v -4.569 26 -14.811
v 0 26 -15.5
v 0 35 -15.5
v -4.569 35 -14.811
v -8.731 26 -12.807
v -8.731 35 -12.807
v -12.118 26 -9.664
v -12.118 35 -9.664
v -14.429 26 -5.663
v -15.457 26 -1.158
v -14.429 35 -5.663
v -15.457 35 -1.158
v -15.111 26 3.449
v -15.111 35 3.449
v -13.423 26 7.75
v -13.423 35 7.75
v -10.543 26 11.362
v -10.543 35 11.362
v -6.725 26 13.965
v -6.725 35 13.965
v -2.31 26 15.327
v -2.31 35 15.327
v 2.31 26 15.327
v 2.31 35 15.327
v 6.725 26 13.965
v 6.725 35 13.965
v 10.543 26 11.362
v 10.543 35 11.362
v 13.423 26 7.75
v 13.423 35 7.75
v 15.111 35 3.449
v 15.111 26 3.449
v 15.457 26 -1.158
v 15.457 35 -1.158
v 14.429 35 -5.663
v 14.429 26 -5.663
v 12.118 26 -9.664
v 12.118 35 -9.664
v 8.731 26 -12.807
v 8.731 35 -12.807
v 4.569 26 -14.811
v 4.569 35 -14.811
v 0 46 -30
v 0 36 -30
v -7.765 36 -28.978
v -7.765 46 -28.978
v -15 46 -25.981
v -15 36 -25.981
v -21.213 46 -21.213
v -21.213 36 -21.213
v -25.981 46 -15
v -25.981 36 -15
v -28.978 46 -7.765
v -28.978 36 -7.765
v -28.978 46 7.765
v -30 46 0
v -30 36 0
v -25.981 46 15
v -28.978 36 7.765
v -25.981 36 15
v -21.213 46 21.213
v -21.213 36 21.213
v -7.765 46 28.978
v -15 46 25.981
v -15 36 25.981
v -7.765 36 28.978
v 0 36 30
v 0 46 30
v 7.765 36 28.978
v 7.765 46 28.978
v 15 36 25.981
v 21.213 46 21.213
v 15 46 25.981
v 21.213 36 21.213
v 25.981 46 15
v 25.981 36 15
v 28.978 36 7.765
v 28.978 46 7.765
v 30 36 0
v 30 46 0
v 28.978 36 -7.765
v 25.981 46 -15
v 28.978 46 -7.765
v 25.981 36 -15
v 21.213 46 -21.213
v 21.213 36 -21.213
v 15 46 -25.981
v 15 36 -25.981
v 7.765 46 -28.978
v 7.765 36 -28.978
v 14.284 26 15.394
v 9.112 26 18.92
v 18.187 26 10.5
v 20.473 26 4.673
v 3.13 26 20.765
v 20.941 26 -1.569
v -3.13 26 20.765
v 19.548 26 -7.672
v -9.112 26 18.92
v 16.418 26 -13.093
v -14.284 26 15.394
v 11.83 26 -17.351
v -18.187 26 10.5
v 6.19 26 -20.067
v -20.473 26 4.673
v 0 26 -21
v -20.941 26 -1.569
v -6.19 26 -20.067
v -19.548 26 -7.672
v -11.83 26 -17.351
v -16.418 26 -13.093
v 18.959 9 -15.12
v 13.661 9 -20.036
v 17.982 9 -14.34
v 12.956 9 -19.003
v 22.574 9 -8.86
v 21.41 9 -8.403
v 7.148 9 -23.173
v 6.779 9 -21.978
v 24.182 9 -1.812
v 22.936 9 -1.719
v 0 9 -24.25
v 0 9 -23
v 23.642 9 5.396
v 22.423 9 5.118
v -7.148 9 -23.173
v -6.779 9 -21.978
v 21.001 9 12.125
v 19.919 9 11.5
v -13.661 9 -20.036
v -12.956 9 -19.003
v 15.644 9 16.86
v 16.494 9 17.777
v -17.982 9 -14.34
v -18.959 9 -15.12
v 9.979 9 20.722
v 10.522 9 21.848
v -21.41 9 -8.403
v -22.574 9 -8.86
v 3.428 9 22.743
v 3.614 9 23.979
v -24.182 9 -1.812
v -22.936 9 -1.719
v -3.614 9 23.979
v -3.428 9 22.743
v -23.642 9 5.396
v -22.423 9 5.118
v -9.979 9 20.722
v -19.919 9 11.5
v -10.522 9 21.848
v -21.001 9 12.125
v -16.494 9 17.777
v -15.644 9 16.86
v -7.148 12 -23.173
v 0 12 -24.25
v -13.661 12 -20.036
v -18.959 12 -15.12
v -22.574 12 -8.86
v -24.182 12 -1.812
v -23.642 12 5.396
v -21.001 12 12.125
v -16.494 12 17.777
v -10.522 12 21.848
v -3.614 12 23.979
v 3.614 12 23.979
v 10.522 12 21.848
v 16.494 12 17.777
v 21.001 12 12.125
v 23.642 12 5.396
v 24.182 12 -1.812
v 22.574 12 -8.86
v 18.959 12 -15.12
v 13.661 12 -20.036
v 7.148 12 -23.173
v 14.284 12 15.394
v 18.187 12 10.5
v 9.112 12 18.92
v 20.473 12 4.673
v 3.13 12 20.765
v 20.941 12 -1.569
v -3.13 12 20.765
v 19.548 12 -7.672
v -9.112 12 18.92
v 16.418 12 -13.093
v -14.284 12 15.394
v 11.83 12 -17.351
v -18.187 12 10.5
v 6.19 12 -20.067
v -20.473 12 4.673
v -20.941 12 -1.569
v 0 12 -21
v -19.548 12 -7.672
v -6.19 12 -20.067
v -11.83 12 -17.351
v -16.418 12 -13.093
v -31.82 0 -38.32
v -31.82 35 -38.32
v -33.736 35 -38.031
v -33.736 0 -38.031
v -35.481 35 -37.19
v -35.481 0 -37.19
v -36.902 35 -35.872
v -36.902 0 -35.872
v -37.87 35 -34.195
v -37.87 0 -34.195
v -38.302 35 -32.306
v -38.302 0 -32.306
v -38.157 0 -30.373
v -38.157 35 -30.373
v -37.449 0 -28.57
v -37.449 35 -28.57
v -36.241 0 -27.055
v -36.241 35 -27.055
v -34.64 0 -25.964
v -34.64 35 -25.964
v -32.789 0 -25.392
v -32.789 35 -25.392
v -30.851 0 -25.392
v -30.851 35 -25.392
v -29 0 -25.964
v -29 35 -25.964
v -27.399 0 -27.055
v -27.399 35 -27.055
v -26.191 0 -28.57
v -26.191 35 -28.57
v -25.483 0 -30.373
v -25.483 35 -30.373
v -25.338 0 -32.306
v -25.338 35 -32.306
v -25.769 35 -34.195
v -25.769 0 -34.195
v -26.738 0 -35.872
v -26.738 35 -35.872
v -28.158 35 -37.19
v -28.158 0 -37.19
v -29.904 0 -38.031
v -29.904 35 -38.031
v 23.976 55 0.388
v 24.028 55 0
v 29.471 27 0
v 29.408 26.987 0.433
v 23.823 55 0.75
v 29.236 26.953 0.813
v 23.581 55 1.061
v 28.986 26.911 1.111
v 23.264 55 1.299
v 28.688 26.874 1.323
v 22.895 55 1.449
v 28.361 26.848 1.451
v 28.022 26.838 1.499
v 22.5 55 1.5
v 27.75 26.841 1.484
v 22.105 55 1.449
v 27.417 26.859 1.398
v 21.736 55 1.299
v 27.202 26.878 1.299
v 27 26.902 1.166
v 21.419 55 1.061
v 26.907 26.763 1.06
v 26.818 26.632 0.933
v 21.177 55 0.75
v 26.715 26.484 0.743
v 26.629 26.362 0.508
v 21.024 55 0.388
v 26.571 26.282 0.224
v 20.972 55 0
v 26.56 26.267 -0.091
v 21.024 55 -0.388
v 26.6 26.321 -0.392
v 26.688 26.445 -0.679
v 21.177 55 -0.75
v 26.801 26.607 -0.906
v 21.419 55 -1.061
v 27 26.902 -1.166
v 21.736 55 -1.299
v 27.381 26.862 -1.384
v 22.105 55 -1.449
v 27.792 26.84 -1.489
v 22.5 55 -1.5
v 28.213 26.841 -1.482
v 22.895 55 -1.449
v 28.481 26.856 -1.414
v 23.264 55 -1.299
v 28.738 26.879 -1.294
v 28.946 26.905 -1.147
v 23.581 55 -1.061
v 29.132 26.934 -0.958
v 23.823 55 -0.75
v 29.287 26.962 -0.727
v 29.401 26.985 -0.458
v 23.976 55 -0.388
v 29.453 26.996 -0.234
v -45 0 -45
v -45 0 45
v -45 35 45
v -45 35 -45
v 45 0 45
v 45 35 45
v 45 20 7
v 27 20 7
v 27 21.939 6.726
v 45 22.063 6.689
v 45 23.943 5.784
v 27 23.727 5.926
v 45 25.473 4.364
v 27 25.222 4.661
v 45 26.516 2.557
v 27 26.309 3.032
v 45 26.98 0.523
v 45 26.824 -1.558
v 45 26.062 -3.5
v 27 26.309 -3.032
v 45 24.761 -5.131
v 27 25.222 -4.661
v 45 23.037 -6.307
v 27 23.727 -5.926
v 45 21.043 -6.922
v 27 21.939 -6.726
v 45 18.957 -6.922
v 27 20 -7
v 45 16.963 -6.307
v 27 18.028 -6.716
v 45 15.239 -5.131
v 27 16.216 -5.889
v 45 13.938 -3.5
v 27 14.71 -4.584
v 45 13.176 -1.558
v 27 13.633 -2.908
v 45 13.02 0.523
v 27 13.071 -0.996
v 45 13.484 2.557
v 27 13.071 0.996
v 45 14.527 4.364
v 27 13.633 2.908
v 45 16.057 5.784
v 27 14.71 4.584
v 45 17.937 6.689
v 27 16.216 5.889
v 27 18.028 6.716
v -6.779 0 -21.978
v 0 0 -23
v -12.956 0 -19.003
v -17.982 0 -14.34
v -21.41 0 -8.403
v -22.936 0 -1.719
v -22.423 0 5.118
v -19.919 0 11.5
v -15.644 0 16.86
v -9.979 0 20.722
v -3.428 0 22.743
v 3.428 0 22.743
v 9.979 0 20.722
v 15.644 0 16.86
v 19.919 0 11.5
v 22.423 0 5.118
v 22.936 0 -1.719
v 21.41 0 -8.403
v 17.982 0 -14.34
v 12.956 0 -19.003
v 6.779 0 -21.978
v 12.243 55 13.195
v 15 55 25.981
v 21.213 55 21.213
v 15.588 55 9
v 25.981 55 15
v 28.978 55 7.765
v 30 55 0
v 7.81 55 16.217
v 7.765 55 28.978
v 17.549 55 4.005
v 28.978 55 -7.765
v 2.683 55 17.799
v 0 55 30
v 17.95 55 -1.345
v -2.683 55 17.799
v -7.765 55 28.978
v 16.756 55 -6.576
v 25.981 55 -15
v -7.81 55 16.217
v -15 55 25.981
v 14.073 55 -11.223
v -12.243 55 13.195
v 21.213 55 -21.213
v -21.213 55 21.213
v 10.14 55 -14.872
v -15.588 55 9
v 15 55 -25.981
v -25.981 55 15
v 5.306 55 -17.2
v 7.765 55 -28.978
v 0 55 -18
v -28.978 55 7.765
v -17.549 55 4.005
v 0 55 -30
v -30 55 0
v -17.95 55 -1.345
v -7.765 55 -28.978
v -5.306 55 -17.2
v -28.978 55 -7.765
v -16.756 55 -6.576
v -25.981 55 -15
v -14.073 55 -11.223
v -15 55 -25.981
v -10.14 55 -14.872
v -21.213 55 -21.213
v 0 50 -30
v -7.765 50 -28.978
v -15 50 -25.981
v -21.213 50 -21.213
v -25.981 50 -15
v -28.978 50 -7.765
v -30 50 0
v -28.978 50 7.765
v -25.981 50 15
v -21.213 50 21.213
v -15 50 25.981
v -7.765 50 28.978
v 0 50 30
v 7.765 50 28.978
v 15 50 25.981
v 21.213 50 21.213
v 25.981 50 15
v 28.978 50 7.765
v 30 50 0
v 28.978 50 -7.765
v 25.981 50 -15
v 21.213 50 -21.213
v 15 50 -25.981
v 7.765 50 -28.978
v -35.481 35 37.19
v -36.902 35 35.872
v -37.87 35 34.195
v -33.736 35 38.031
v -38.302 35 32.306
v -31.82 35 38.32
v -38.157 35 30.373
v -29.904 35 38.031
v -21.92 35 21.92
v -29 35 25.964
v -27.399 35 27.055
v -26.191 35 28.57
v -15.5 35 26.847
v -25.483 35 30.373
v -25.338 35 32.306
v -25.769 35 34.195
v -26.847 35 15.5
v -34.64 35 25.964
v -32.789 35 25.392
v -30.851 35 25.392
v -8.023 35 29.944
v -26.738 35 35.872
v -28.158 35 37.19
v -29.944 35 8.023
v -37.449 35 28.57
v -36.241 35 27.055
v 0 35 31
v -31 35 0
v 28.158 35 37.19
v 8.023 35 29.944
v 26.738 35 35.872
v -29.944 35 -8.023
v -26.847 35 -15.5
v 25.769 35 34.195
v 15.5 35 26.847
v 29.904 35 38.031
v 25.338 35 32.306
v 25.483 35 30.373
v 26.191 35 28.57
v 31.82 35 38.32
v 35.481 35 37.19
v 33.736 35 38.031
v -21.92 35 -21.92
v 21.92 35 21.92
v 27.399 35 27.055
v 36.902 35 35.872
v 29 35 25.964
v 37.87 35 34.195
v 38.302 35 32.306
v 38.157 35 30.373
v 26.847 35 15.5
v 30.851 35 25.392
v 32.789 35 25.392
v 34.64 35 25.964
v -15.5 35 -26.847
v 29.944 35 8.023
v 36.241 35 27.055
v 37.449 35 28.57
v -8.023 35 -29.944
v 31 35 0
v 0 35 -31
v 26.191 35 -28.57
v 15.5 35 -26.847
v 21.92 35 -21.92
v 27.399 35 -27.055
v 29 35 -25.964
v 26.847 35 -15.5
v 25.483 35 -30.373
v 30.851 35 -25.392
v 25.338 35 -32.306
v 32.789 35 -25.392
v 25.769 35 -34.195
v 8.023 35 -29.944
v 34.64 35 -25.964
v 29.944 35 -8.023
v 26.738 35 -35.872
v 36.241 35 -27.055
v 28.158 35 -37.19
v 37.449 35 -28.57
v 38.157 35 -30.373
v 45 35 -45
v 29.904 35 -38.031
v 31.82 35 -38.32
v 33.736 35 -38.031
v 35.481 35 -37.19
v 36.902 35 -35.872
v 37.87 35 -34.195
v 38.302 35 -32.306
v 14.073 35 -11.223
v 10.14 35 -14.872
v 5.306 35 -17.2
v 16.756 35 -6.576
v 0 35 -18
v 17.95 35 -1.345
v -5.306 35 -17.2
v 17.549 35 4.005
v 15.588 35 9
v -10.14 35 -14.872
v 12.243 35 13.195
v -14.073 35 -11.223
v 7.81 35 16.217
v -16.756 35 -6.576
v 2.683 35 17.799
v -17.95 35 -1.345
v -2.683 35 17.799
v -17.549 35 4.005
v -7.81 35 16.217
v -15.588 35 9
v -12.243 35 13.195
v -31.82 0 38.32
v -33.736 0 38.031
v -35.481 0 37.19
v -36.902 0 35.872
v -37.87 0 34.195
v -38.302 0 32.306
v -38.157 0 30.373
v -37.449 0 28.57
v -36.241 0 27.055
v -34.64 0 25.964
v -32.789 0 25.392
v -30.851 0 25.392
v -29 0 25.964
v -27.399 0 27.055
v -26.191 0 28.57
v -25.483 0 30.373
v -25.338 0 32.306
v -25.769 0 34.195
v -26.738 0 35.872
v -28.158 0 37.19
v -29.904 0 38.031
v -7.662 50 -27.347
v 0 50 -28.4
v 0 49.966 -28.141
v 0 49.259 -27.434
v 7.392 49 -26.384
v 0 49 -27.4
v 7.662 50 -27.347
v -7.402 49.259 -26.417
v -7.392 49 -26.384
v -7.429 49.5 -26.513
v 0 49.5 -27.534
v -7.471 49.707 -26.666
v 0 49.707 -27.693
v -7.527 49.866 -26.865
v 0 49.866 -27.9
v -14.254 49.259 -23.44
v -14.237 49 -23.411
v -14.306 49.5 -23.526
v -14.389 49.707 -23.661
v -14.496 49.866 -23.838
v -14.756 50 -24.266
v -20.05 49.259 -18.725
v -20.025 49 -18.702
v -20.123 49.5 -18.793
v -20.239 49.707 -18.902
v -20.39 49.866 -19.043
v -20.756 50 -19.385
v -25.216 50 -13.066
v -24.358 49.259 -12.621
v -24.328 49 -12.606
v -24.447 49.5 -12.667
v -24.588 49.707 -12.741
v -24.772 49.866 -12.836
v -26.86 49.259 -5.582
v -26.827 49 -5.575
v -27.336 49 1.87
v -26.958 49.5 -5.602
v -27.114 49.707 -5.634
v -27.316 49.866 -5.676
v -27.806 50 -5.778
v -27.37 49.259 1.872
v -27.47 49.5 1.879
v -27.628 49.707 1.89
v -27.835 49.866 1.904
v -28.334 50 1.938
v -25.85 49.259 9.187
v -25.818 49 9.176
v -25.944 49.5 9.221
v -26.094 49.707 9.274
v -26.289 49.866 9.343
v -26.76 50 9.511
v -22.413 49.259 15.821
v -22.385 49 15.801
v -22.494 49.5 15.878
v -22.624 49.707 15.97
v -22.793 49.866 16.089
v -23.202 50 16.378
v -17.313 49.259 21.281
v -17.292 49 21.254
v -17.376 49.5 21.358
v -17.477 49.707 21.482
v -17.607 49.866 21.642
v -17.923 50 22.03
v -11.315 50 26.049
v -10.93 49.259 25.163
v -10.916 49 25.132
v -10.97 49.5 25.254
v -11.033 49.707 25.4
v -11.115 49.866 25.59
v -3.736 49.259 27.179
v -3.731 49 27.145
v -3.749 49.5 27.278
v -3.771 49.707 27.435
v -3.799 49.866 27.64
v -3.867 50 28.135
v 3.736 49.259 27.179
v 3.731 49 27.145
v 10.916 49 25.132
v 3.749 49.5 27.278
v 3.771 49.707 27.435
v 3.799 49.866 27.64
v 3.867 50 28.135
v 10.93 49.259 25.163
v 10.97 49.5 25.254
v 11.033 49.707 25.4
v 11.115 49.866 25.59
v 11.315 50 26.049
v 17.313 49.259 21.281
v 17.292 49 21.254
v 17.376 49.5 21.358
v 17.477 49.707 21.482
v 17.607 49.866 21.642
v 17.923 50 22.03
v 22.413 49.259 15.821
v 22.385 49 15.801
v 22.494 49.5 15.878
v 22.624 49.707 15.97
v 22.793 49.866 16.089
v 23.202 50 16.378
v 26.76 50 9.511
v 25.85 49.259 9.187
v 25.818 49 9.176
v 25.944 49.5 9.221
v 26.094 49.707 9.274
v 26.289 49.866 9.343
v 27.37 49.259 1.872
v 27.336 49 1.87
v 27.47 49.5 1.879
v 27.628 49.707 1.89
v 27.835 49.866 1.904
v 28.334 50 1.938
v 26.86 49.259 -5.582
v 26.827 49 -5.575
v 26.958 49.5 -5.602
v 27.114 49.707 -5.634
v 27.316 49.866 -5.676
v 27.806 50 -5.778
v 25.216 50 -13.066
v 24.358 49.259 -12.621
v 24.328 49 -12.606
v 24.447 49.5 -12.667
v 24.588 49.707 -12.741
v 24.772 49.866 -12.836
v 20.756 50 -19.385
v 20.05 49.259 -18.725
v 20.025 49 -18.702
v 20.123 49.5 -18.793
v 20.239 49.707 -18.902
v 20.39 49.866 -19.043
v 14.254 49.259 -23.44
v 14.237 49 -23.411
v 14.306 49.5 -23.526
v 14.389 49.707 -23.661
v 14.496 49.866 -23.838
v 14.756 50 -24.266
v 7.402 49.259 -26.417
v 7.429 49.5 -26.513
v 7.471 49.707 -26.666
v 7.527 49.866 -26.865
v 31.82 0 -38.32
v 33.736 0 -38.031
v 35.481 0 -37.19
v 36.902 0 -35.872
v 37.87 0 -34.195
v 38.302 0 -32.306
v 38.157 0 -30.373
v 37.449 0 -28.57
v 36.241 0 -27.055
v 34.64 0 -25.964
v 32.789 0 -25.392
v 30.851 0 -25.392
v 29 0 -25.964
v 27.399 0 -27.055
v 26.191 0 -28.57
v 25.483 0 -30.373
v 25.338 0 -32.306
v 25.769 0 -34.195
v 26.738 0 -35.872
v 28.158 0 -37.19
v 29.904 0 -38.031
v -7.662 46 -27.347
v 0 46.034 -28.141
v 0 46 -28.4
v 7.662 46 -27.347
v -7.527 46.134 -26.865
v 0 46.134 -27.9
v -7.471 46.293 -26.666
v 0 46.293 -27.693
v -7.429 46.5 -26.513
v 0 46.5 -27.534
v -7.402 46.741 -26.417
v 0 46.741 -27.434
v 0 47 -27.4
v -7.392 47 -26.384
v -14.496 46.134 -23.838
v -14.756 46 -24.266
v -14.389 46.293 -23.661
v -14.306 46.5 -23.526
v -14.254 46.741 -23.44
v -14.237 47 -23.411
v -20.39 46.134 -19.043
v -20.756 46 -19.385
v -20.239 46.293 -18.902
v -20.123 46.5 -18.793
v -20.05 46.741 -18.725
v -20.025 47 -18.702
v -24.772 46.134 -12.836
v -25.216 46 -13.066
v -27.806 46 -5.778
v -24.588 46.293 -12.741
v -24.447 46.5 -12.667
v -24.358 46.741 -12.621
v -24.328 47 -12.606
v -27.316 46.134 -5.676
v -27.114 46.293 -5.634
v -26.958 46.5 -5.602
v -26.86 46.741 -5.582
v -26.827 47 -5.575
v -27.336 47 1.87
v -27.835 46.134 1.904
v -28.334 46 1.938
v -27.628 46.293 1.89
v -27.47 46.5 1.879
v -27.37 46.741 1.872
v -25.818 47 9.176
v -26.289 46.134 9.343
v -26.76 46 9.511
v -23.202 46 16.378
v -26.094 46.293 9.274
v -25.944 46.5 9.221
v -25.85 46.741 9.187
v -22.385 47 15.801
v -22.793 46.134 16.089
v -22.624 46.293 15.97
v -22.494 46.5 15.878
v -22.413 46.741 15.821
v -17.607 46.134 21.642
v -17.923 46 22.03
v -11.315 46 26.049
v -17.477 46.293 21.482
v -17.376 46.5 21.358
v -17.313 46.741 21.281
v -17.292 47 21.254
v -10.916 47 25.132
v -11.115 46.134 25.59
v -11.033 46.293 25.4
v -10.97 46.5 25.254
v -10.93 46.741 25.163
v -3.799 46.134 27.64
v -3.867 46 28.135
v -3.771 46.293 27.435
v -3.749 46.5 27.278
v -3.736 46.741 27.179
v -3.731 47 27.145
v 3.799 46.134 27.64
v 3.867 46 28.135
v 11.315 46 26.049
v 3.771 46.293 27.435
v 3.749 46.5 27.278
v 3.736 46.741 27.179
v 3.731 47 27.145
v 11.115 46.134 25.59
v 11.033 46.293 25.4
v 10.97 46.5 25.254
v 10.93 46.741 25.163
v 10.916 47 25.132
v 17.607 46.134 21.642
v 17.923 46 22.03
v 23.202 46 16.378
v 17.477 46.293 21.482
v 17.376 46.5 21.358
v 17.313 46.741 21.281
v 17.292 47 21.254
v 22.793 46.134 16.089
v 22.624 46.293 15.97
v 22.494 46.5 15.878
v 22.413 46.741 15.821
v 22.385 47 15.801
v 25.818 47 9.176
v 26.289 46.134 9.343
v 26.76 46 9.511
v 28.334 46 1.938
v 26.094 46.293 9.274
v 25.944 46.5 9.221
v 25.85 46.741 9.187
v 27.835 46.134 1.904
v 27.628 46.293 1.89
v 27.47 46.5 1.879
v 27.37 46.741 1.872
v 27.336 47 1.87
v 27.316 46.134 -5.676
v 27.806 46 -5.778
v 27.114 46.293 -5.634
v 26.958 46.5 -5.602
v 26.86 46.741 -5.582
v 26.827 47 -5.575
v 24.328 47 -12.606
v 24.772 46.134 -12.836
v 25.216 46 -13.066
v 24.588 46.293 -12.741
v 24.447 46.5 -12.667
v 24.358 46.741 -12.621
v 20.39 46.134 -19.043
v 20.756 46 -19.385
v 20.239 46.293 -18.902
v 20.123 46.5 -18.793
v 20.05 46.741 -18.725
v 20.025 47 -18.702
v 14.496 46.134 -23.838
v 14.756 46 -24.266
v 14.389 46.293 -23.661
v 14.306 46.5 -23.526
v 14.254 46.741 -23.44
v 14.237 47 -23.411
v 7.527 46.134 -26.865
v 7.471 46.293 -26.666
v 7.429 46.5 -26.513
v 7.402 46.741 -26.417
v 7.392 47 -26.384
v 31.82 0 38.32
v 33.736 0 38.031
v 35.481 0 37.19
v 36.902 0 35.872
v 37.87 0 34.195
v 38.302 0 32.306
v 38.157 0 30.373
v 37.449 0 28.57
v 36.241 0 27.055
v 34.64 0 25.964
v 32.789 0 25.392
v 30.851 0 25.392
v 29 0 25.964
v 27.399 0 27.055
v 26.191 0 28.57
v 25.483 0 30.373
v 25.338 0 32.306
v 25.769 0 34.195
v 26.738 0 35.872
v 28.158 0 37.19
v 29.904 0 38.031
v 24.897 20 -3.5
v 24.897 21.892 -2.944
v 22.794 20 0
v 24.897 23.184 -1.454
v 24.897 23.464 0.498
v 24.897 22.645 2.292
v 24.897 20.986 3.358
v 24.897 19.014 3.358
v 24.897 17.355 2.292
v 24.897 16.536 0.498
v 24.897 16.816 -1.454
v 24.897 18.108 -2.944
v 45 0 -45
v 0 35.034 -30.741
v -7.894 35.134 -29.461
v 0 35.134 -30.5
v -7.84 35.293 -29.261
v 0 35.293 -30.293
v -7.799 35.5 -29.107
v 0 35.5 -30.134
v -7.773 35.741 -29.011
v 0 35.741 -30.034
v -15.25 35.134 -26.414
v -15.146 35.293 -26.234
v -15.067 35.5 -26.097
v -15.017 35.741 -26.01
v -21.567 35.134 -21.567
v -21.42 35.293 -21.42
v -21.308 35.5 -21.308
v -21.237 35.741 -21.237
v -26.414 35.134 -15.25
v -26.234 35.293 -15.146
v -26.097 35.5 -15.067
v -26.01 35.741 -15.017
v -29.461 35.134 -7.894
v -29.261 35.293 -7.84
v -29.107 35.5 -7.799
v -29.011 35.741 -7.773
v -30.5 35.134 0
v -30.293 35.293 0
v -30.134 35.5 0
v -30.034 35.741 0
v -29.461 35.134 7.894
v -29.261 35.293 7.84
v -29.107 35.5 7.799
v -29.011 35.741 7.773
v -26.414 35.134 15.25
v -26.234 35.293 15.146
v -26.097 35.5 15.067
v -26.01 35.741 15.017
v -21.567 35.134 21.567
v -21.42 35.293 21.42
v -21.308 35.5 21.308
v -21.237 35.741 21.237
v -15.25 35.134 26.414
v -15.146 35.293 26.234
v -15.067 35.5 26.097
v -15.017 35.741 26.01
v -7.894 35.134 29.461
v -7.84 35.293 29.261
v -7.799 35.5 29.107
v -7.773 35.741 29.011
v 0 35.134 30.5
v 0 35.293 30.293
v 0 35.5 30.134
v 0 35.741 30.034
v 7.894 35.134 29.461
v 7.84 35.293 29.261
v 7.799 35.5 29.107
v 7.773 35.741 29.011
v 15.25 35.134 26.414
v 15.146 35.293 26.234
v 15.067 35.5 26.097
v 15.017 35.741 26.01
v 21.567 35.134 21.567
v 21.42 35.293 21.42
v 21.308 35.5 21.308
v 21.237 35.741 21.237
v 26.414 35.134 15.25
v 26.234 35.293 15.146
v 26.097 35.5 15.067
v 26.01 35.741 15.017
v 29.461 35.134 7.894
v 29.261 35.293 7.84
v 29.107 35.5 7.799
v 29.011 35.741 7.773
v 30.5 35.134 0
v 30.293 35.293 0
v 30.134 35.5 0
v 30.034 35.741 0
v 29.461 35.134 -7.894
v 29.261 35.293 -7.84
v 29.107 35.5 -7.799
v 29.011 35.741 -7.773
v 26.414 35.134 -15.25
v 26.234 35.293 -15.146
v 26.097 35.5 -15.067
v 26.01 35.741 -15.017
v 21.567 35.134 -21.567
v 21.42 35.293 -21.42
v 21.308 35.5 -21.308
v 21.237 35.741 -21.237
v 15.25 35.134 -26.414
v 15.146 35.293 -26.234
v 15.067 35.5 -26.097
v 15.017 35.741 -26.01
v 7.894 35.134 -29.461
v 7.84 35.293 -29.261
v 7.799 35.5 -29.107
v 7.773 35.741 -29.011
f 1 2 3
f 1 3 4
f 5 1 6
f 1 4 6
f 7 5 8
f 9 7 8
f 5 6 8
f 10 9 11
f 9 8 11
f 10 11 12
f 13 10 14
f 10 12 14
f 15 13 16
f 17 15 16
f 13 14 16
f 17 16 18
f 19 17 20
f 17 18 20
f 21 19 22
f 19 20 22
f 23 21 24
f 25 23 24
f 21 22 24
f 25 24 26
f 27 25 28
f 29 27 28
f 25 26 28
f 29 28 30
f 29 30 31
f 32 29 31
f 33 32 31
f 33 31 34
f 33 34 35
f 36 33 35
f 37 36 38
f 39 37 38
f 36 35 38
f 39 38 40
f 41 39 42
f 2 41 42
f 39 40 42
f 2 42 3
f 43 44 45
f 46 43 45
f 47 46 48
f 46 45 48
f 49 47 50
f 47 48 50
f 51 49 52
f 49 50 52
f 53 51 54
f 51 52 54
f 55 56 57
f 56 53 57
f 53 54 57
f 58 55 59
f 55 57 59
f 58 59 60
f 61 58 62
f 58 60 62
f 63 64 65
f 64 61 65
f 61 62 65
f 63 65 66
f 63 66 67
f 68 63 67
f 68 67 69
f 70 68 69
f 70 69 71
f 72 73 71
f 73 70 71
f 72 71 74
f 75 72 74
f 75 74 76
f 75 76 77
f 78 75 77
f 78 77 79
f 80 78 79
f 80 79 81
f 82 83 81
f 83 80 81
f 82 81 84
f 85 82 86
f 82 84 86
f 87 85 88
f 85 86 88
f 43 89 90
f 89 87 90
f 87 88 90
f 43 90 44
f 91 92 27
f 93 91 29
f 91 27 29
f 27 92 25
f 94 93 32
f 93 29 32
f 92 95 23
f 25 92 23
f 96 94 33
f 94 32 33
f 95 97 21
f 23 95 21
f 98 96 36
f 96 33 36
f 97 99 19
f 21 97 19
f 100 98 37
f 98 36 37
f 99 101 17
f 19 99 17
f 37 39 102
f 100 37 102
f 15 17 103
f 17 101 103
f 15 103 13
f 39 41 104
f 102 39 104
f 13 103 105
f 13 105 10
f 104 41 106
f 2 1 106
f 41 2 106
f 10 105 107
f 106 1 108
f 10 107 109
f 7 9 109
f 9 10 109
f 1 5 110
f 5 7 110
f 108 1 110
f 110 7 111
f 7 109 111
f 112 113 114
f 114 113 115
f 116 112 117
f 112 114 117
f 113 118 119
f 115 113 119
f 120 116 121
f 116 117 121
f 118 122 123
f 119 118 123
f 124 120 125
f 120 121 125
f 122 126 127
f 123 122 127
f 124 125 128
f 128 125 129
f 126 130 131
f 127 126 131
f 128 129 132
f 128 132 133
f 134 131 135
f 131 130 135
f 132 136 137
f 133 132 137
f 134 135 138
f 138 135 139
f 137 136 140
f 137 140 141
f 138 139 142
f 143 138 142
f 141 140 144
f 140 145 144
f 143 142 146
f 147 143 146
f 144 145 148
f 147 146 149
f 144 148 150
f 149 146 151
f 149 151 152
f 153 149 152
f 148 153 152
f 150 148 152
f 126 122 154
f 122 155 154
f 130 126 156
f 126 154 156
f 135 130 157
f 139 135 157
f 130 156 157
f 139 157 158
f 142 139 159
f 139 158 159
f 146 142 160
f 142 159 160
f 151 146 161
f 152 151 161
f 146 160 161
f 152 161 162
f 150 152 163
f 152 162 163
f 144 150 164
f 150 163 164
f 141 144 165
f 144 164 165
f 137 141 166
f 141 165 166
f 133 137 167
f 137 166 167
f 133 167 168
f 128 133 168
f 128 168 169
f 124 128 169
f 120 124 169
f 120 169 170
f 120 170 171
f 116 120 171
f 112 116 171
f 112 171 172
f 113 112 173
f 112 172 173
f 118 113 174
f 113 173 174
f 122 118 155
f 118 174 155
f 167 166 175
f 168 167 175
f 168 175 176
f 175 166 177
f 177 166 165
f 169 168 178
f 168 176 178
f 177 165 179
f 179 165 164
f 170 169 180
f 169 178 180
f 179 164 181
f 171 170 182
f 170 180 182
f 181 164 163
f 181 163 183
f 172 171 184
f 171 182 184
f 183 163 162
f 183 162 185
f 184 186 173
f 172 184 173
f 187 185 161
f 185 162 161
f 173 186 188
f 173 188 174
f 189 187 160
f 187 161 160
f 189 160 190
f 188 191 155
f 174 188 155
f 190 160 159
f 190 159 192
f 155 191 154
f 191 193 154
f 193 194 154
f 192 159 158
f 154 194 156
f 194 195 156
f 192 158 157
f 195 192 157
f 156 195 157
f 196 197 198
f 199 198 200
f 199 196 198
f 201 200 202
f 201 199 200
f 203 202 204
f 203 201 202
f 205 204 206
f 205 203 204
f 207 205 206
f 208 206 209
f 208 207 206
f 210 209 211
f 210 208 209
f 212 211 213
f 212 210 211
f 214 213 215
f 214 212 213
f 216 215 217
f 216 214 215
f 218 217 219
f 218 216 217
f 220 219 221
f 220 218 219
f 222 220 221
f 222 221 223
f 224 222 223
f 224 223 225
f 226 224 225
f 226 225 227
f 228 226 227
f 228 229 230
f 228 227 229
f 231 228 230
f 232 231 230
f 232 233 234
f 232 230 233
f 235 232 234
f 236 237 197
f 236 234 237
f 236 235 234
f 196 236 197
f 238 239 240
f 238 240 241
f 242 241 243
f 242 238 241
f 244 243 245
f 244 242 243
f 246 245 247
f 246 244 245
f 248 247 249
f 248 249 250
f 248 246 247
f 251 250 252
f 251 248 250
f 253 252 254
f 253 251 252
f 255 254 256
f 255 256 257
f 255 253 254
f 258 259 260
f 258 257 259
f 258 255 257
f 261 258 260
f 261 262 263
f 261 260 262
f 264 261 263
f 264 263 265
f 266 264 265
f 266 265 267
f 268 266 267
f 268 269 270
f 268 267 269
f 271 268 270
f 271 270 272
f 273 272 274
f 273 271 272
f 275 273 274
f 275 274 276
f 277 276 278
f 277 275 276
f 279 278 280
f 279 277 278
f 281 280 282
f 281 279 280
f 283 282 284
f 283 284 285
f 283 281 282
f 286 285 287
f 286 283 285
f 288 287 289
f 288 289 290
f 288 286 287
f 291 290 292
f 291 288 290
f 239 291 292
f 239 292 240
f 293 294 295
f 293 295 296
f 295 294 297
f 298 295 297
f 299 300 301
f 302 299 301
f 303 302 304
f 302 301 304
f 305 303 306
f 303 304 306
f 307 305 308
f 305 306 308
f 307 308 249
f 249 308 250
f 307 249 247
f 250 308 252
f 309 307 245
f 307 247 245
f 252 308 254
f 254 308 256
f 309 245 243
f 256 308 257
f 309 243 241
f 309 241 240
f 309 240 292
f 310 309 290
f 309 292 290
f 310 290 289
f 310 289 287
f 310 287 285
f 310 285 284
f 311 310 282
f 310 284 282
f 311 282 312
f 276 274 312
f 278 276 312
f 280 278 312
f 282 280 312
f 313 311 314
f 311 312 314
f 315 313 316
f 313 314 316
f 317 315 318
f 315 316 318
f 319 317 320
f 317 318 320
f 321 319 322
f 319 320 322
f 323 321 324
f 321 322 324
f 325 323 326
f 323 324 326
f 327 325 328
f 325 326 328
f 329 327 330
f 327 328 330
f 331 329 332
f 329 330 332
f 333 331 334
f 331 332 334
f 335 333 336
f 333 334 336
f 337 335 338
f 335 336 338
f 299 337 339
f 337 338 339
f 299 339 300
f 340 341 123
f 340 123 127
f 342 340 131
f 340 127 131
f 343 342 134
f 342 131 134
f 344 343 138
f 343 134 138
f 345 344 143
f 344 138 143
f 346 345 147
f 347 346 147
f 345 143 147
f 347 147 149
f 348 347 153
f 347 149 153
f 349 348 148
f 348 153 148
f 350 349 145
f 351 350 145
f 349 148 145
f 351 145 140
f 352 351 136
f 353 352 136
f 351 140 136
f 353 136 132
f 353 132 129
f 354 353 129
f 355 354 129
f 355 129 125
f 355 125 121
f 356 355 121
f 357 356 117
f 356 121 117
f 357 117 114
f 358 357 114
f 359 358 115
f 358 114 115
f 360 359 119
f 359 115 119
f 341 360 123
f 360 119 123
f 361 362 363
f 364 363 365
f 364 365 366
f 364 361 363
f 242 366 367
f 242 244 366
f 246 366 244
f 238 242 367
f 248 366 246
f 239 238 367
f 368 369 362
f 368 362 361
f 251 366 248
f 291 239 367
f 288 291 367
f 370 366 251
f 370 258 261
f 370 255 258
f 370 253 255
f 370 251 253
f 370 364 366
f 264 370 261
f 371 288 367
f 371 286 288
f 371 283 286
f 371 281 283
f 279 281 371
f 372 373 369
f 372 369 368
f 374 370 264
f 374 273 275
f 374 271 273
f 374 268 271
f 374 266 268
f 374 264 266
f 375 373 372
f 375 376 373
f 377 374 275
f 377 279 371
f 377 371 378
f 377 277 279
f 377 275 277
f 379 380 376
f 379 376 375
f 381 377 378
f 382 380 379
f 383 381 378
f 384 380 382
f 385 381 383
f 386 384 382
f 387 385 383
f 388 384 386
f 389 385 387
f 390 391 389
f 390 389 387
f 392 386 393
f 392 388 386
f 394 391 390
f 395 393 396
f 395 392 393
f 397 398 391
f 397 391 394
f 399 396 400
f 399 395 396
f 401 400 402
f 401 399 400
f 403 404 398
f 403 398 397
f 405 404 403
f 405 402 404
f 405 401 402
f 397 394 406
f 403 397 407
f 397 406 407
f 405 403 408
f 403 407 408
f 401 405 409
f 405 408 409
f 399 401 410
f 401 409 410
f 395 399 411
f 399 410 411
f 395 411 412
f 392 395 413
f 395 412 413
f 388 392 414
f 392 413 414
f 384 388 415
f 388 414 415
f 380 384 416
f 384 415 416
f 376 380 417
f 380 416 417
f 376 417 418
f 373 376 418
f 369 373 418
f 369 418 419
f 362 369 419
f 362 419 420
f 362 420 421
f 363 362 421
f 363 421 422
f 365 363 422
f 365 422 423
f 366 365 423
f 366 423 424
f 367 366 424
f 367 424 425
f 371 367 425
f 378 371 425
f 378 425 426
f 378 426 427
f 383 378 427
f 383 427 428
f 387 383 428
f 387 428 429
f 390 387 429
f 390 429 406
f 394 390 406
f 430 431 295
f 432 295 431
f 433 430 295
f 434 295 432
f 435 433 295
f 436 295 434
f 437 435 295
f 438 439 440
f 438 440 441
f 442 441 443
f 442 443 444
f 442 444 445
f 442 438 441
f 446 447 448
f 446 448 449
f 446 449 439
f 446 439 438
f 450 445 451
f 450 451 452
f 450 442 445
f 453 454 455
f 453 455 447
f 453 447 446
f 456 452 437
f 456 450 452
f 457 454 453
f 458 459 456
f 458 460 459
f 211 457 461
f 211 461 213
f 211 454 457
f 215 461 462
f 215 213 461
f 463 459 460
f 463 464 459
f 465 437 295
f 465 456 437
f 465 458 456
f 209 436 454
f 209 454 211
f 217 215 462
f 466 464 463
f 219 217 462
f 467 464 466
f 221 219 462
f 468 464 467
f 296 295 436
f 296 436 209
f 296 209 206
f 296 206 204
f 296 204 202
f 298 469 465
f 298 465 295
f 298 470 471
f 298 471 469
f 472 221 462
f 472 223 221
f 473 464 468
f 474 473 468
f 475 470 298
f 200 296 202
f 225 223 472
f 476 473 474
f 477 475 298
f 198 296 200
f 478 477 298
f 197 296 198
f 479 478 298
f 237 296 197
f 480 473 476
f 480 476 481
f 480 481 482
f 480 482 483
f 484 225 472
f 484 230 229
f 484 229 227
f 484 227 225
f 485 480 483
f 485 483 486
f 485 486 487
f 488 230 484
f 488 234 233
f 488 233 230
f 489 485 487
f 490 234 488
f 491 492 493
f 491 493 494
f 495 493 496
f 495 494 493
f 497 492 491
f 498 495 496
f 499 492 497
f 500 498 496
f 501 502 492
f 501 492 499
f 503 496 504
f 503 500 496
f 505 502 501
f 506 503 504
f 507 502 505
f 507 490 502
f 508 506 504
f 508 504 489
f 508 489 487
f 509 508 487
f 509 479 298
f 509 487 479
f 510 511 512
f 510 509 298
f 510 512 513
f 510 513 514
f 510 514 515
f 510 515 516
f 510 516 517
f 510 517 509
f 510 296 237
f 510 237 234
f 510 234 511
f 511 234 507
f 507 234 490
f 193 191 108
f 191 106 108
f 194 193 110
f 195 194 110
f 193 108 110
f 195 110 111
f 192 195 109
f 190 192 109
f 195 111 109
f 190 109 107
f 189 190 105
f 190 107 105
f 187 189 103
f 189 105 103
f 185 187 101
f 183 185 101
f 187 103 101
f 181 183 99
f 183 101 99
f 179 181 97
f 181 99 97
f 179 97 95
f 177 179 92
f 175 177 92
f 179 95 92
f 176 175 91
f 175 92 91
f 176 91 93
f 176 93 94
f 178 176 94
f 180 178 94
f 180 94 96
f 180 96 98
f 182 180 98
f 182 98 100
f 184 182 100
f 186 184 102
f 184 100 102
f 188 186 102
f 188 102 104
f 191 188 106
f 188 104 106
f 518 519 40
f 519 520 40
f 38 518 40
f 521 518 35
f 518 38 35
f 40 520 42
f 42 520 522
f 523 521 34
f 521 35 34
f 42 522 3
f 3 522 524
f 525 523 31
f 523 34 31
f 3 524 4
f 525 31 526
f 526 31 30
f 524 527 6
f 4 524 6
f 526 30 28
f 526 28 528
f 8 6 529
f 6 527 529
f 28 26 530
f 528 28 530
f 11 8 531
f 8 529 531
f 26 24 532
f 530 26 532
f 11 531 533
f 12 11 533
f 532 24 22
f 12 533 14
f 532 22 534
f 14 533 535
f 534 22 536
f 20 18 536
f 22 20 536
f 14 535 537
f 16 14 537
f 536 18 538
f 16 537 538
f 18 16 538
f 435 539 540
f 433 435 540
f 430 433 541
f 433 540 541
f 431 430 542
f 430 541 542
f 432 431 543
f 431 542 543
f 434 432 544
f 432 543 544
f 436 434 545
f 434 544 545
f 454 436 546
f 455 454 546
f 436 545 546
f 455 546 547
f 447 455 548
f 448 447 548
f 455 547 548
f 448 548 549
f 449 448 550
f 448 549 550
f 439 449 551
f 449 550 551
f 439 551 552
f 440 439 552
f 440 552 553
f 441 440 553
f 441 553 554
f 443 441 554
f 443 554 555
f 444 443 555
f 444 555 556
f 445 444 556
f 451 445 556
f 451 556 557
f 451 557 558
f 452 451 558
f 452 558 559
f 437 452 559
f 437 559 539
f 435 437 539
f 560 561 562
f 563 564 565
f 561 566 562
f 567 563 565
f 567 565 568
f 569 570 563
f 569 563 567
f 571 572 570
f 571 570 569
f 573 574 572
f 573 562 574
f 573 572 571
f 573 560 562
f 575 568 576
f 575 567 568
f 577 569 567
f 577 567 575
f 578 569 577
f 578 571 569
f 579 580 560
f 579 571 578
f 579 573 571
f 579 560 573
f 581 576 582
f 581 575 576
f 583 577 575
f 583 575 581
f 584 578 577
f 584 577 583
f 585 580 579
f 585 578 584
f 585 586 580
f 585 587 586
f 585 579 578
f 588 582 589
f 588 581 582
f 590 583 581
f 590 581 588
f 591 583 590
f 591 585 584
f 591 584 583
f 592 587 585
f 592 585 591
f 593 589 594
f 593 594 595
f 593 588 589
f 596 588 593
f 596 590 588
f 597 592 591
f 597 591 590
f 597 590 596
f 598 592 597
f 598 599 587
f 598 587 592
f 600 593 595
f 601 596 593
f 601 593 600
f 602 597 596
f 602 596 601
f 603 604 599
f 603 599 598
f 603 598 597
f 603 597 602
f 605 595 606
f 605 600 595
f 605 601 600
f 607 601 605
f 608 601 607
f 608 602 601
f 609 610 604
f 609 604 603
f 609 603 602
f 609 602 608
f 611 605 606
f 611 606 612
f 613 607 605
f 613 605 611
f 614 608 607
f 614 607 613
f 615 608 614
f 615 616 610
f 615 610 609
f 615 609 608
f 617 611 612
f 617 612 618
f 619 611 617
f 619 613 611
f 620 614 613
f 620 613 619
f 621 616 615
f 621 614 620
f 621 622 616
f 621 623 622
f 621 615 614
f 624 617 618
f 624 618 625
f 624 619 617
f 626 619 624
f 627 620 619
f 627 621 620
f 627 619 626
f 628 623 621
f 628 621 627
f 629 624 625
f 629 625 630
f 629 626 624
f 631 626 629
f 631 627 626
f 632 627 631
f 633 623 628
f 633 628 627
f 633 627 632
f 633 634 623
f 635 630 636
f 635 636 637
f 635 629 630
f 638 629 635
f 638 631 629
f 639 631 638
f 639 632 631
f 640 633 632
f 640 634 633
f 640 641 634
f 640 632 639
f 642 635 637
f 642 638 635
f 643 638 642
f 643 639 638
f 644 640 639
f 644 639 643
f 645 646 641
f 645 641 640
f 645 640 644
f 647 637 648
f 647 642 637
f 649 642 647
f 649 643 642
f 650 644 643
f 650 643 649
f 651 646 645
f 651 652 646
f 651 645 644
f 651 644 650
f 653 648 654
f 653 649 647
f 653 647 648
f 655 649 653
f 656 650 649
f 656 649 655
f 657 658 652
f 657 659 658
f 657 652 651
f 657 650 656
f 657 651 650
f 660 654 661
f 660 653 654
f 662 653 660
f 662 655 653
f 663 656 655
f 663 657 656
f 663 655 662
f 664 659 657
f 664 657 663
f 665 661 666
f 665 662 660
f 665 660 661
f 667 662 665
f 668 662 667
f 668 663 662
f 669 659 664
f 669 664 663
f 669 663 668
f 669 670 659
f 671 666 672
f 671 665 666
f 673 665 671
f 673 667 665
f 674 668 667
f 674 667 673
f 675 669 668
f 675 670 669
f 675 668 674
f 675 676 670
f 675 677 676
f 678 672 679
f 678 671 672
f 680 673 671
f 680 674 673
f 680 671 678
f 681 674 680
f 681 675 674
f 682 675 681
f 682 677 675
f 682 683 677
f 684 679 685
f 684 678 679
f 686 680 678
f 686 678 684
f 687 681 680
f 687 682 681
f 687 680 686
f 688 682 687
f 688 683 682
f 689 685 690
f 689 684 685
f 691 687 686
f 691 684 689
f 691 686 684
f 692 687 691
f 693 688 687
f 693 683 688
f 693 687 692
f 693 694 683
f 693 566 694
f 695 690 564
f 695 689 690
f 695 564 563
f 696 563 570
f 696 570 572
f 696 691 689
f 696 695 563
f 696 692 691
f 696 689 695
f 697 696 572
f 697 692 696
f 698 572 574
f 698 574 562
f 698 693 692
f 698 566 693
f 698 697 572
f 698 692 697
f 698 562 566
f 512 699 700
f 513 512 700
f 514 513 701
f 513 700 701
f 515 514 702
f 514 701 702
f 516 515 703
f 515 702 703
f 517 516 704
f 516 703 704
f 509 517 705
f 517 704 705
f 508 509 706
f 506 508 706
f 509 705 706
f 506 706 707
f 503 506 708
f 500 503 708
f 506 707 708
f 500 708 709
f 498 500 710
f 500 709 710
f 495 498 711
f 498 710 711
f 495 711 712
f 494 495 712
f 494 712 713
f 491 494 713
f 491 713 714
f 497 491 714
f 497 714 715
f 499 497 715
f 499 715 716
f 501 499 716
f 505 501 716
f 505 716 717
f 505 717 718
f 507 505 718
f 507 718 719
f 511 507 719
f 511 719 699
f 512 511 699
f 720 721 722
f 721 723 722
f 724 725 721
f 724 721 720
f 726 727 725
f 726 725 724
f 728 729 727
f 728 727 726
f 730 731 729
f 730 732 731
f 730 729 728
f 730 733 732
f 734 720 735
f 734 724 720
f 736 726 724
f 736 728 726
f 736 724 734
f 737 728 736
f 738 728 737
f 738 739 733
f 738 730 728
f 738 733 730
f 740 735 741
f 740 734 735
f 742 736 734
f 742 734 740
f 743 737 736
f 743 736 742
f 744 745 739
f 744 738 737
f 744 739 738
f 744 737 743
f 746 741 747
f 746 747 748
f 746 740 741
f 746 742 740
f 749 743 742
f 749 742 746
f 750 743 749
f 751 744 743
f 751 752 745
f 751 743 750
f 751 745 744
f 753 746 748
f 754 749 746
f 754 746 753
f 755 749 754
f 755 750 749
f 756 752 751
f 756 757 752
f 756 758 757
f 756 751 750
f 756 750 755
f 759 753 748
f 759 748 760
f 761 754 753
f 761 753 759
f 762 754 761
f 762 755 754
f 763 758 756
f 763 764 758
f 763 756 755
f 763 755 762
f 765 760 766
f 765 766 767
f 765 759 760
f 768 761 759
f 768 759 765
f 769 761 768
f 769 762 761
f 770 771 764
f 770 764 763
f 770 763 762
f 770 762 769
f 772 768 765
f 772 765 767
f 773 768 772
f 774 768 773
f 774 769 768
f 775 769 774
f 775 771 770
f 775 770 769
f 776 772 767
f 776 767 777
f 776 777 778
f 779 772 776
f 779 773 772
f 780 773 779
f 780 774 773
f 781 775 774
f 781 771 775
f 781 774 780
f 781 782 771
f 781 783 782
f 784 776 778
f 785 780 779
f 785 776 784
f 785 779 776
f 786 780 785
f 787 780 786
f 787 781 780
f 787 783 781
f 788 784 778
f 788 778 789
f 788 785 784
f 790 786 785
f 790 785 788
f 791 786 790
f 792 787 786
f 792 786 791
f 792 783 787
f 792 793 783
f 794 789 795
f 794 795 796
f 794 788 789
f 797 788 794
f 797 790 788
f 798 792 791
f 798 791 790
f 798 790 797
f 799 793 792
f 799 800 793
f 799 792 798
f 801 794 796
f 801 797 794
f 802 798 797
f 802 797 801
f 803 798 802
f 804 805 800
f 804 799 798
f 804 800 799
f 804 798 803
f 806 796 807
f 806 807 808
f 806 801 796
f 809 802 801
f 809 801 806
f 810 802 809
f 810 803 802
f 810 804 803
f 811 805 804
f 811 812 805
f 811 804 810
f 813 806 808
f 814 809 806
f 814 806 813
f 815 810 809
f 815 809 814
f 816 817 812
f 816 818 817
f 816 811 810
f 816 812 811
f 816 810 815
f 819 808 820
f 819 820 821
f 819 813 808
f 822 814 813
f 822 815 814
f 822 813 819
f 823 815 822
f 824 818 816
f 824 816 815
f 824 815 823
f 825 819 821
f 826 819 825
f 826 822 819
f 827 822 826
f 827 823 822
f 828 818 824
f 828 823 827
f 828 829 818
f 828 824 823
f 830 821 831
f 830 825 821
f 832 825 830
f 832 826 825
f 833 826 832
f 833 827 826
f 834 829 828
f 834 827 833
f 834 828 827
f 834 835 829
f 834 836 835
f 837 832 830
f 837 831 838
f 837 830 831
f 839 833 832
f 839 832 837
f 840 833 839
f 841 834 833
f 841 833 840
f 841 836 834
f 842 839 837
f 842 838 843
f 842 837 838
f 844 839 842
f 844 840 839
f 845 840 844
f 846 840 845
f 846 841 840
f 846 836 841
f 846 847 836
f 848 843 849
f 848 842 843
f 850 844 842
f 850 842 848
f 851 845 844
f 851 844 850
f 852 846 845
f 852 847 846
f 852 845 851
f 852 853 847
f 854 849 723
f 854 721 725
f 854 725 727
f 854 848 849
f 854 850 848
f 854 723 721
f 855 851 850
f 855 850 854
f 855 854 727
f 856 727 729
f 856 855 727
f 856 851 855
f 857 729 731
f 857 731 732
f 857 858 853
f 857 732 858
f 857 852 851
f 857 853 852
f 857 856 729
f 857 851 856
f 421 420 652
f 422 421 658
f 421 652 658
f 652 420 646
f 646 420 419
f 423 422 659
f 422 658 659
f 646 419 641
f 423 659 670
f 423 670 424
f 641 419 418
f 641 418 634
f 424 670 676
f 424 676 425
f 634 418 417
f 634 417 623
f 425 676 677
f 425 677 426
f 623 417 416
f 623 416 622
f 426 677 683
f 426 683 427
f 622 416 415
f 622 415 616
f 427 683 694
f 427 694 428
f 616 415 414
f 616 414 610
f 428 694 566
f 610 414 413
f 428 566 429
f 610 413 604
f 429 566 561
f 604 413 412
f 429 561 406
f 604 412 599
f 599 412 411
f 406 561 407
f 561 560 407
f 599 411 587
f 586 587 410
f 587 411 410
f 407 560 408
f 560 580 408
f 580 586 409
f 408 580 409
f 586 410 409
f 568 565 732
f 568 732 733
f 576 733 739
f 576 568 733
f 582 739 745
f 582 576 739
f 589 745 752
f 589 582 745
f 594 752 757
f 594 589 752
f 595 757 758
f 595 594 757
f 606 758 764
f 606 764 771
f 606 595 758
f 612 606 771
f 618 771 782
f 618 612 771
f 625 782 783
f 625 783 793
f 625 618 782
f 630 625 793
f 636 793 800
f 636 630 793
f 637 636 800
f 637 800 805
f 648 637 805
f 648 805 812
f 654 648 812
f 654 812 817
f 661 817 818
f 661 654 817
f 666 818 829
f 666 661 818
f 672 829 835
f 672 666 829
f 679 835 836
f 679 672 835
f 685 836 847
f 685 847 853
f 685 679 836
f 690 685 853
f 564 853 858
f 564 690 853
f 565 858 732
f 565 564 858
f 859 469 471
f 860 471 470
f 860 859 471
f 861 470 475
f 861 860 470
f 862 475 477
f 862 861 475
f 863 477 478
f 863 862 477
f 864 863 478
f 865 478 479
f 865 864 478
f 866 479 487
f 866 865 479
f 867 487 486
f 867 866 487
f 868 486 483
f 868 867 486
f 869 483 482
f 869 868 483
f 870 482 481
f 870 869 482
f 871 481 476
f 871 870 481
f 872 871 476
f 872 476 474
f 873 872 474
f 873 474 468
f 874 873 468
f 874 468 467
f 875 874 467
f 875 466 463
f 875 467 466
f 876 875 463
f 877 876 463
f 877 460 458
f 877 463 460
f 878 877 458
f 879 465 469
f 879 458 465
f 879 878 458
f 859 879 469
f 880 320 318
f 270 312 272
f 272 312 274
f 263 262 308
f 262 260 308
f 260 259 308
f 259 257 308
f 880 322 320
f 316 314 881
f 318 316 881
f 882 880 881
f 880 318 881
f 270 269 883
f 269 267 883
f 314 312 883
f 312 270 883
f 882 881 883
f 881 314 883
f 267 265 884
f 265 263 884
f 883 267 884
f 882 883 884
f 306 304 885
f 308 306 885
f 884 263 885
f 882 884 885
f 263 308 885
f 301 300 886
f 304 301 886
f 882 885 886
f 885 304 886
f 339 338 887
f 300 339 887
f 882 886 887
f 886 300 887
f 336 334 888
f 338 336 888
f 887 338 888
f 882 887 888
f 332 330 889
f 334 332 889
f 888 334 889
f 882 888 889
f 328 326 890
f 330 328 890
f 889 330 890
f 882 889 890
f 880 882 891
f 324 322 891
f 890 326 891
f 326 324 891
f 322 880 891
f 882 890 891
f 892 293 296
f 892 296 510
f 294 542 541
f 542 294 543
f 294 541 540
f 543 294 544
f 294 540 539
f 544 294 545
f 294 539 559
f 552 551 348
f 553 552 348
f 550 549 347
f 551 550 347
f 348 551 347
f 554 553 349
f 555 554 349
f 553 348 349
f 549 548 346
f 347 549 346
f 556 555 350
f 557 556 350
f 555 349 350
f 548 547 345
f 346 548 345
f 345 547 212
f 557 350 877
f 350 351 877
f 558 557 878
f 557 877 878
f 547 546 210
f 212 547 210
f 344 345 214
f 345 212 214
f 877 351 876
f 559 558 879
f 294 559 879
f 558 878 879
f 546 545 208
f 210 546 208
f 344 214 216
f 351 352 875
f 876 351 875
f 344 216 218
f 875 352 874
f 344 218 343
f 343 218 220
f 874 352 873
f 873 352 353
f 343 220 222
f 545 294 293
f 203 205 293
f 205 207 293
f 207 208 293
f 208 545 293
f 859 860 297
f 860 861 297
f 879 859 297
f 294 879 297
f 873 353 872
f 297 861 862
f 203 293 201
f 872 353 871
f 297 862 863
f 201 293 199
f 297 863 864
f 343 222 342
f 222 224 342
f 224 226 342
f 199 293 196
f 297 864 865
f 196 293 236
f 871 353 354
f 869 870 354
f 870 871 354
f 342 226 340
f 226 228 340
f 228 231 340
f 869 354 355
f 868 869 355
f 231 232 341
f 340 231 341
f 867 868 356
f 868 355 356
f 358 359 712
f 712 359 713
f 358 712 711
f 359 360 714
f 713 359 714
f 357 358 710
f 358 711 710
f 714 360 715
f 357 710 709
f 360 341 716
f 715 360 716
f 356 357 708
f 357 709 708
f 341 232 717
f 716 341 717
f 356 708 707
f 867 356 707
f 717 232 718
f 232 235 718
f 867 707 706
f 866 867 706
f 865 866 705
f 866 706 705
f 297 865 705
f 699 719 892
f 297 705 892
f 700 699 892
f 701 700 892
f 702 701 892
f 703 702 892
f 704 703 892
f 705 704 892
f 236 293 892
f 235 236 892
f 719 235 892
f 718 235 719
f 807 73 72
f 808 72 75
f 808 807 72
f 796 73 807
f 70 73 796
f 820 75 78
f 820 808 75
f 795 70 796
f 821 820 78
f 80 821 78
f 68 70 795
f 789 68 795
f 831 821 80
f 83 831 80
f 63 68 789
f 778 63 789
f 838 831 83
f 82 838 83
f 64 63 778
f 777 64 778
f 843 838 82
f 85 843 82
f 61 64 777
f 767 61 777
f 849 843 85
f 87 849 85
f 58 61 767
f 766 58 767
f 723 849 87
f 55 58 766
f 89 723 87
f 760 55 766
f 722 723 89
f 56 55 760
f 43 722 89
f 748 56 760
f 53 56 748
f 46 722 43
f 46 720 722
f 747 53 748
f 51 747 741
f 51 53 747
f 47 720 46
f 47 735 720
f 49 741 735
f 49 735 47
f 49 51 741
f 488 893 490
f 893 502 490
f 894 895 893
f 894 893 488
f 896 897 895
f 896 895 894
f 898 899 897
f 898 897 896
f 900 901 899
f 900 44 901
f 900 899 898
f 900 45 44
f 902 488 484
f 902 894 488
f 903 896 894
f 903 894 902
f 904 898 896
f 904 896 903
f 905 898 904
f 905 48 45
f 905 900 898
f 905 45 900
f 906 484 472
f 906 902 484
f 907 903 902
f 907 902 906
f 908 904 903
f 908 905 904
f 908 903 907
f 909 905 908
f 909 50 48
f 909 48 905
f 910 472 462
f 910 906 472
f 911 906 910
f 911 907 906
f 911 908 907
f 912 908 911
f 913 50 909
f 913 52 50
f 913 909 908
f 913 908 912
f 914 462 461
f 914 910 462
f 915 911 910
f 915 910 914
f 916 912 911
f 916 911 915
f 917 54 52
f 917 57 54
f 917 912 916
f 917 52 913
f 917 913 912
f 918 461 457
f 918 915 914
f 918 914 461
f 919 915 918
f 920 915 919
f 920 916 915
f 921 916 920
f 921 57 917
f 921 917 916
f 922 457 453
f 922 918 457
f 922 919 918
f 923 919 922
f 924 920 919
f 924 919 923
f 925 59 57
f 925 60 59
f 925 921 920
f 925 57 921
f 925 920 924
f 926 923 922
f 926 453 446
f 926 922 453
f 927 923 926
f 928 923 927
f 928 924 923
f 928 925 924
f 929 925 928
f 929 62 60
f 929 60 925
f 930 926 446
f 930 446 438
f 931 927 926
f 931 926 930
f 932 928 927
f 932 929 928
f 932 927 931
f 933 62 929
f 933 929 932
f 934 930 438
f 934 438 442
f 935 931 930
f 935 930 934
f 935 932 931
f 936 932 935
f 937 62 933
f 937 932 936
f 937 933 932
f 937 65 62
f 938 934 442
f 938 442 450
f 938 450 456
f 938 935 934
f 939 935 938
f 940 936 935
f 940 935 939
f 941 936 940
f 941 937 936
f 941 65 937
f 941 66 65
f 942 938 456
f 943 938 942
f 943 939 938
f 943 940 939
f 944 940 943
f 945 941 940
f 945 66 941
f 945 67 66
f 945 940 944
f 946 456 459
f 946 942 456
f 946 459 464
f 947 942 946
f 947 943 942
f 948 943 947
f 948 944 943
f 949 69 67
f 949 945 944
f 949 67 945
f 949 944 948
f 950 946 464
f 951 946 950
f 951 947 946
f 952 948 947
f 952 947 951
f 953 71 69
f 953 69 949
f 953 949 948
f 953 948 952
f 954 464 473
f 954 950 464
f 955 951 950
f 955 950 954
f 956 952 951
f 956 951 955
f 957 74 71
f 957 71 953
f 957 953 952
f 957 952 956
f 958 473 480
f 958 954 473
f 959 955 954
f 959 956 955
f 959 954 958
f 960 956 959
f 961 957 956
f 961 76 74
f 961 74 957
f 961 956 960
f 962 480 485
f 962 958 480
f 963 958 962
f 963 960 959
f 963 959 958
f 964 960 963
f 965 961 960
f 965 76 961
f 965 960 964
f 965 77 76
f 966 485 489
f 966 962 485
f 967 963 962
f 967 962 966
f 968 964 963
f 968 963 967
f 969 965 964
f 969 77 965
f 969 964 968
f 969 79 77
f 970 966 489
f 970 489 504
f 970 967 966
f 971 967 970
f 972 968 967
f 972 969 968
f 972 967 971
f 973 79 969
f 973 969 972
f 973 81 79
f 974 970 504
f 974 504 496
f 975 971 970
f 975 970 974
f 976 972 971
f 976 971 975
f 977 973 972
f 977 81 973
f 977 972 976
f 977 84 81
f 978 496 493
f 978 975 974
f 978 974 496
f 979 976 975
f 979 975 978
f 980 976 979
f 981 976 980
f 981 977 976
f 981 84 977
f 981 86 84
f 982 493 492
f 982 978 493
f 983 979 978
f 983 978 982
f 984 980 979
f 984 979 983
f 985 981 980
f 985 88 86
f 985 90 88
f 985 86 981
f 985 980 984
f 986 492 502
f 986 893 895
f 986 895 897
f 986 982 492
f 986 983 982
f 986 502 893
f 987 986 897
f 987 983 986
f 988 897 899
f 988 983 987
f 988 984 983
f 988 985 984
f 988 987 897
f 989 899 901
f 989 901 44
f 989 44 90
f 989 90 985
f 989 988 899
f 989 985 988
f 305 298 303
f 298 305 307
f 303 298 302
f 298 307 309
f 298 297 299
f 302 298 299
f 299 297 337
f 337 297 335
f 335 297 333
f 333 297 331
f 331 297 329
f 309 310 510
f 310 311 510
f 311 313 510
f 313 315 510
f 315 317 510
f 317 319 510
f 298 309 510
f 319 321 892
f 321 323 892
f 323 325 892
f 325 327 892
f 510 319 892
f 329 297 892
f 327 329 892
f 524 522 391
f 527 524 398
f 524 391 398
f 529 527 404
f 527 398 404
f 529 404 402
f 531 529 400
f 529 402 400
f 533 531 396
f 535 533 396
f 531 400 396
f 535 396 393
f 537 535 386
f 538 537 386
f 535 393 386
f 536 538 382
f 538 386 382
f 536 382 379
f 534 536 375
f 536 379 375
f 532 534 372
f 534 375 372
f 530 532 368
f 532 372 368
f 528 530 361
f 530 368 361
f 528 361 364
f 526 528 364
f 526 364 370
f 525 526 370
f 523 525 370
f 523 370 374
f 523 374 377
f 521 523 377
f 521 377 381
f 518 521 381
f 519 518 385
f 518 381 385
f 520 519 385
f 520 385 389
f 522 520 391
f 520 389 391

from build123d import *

# Parameters (mm, degrees)
SKETCH1_W                  = 90
SKETCH1_H                  = 90
EXTRUDE1_DEPTH             = 35
SKETCH2_R                  = 30
EXTRUDE2_DEPTH             = 20
SKETCH5_W                  = 6.681632653
SKETCH5_H                  = 4
SKETCH6_R                  = 6.5
CUT_EXTRUDE1_DEPTH         = 85.113019206
MIRROR2_COPY_1_SKETCH_R    = 6.5
MIRROR2_COPY_1_DEPTH       = 85.113019206
M16X2_0_TAPPED_HOLE1_D     = 14
M16X2_0_TAPPED_HOLE1_DEPTH = 18
M16X2_0_TAPPED_HOLE1_TIP   = 4.206024333
FILLET1_R                  = 1
CUT_SWEEP1_START           = -49.987863257
CUT_SWEEP1_OUTLINE_R       = 1.5
CUT_SWEEP1_DEPTH           = 29.274008659


# Read off the part's stored shape, not the designer's step: Cut-Sweep1
with BuildPart() as part:
    # Sketch1 → Extrude1 (new body)
    with BuildSketch(Plane(origin=(0, 0, 0), x_dir=(1, 0, 0), z_dir=(0, 1, 0))):
        Rectangle(SKETCH1_W, SKETCH1_H)
    extrude(amount=EXTRUDE1_DEPTH)

    # Sketch2 → Extrude2 (add)
    with BuildSketch(Plane(origin=(0, 35, 0), x_dir=(-1, 0, 0), z_dir=(0, 1, 0))):
        with Locations(Location((0, 0, 0), (0, 0, 270))):
            Circle(SKETCH2_R)
    extrude(amount=EXTRUDE2_DEPTH)

    # Sketch3 → Cut-Revolve1 (revolve, cut)
    with BuildSketch(Plane.XY, mode=Mode.PRIVATE) as cut_revolve1_sk:
        Polygon((0, 0), (-23, 0), (-23, 9), (-24.25, 9), (-24.25, 12), (-21, 12), (-21, 26), (-15.5, 26), (-15.5, 35), (-18, 35), (-18, 55), (0, 55), align=None)
    revolve(cut_revolve1_sk.sketch.rotate(Axis((0, 0, 0), (0, 1, 0)), 270), axis=Axis((0, 0, 0), (0, 1, 0)), mode=Mode.SUBTRACT)

    # Sketch5 → Cut-Revolve2 (revolve, cut)
    with BuildSketch(Plane.XY, mode=Mode.PRIVATE) as cut_revolve2_sk:
        with Locations((-30.740816327, 48)):
            Rectangle(SKETCH5_W, SKETCH5_H)
    revolve(cut_revolve2_sk.sketch.rotate(Axis((0, 0, 0), (0, 1, 0)), 270), axis=Axis((0, 0, 0), (0, 1, 0)), mode=Mode.SUBTRACT)

    # Sketch6 → Cut-Extrude1 (cut, through all)
    with BuildSketch(Plane.XZ):
        with Locations(Location((31.819805153, -31.819805153, 0), (0, 0, 270))):
            Circle(SKETCH6_R)
    cut_extrude1 = extrude(amount=-CUT_EXTRUDE1_DEPTH, mode=Mode.SUBTRACT)

    # Mirror1: Cut-Extrude1 across plane
    add(cut_extrude1.mirror(Plane.XY), mode=Mode.SUBTRACT)

    # Mirror2: Cut-Extrude1 across plane
    add(cut_extrude1.mirror(Plane(origin=(0, 0, 0), x_dir=(0, 0, 1), z_dir=(1, 0, 0))), mode=Mode.SUBTRACT)

    # Mirror2 copy 1 sketch → Mirror2 copy 1 (cut, through all)
    with BuildSketch(Plane(origin=(0, 0, 0), x_dir=(-1, 0, 0), z_dir=(0, -1, 0))):
        with Locations(Location((31.819805153, -31.819805153, 0), (0, 0, 270))):
            Circle(MIRROR2_COPY_1_SKETCH_R)
    extrude(amount=-MIRROR2_COPY_1_DEPTH, mode=Mode.SUBTRACT)

    # M16x2.0 Tapped Hole1
    with Locations(Plane(origin=(45, 0, 0), x_dir=(0, 0, -1), z_dir=(1, 0, 0))):
        with Locations((0, 20)):
            Hole(M16X2_0_TAPPED_HOLE1_D / 2, depth=M16X2_0_TAPPED_HOLE1_DEPTH)
            with Locations((0, 0, -(M16X2_0_TAPPED_HOLE1_DEPTH + M16X2_0_TAPPED_HOLE1_TIP / 2))):  # 118° drill point
                Cone(0, M16X2_0_TAPPED_HOLE1_D / 2, M16X2_0_TAPPED_HOLE1_TIP, mode=Mode.SUBTRACT)

    # Fillet1
    fillet1_edges = [part.edges().sort_by_distance(p)[0] for p in [
        (0, 35, 30),
        (0, 50, 27.4),
        (0, 46, 27.4),
    ]]
    fillet(fillet1_edges, radius=FILLET1_R)

    # Cut-Sweep1 outline → Cut-Sweep1 (cut)
    with BuildSketch(Plane(origin=(0, 0, 0), x_dir=(0.981627183447665, 0.19080899537653903, 0), z_dir=(0.19080899537653903, -0.9816271834476651, 0)).offset(CUT_SWEEP1_START)):
        with Locations((32.581106373, 0)):
            Circle(CUT_SWEEP1_OUTLINE_R)
    extrude(amount=CUT_SWEEP1_DEPTH, mode=Mode.SUBTRACT)


solid = part.part
